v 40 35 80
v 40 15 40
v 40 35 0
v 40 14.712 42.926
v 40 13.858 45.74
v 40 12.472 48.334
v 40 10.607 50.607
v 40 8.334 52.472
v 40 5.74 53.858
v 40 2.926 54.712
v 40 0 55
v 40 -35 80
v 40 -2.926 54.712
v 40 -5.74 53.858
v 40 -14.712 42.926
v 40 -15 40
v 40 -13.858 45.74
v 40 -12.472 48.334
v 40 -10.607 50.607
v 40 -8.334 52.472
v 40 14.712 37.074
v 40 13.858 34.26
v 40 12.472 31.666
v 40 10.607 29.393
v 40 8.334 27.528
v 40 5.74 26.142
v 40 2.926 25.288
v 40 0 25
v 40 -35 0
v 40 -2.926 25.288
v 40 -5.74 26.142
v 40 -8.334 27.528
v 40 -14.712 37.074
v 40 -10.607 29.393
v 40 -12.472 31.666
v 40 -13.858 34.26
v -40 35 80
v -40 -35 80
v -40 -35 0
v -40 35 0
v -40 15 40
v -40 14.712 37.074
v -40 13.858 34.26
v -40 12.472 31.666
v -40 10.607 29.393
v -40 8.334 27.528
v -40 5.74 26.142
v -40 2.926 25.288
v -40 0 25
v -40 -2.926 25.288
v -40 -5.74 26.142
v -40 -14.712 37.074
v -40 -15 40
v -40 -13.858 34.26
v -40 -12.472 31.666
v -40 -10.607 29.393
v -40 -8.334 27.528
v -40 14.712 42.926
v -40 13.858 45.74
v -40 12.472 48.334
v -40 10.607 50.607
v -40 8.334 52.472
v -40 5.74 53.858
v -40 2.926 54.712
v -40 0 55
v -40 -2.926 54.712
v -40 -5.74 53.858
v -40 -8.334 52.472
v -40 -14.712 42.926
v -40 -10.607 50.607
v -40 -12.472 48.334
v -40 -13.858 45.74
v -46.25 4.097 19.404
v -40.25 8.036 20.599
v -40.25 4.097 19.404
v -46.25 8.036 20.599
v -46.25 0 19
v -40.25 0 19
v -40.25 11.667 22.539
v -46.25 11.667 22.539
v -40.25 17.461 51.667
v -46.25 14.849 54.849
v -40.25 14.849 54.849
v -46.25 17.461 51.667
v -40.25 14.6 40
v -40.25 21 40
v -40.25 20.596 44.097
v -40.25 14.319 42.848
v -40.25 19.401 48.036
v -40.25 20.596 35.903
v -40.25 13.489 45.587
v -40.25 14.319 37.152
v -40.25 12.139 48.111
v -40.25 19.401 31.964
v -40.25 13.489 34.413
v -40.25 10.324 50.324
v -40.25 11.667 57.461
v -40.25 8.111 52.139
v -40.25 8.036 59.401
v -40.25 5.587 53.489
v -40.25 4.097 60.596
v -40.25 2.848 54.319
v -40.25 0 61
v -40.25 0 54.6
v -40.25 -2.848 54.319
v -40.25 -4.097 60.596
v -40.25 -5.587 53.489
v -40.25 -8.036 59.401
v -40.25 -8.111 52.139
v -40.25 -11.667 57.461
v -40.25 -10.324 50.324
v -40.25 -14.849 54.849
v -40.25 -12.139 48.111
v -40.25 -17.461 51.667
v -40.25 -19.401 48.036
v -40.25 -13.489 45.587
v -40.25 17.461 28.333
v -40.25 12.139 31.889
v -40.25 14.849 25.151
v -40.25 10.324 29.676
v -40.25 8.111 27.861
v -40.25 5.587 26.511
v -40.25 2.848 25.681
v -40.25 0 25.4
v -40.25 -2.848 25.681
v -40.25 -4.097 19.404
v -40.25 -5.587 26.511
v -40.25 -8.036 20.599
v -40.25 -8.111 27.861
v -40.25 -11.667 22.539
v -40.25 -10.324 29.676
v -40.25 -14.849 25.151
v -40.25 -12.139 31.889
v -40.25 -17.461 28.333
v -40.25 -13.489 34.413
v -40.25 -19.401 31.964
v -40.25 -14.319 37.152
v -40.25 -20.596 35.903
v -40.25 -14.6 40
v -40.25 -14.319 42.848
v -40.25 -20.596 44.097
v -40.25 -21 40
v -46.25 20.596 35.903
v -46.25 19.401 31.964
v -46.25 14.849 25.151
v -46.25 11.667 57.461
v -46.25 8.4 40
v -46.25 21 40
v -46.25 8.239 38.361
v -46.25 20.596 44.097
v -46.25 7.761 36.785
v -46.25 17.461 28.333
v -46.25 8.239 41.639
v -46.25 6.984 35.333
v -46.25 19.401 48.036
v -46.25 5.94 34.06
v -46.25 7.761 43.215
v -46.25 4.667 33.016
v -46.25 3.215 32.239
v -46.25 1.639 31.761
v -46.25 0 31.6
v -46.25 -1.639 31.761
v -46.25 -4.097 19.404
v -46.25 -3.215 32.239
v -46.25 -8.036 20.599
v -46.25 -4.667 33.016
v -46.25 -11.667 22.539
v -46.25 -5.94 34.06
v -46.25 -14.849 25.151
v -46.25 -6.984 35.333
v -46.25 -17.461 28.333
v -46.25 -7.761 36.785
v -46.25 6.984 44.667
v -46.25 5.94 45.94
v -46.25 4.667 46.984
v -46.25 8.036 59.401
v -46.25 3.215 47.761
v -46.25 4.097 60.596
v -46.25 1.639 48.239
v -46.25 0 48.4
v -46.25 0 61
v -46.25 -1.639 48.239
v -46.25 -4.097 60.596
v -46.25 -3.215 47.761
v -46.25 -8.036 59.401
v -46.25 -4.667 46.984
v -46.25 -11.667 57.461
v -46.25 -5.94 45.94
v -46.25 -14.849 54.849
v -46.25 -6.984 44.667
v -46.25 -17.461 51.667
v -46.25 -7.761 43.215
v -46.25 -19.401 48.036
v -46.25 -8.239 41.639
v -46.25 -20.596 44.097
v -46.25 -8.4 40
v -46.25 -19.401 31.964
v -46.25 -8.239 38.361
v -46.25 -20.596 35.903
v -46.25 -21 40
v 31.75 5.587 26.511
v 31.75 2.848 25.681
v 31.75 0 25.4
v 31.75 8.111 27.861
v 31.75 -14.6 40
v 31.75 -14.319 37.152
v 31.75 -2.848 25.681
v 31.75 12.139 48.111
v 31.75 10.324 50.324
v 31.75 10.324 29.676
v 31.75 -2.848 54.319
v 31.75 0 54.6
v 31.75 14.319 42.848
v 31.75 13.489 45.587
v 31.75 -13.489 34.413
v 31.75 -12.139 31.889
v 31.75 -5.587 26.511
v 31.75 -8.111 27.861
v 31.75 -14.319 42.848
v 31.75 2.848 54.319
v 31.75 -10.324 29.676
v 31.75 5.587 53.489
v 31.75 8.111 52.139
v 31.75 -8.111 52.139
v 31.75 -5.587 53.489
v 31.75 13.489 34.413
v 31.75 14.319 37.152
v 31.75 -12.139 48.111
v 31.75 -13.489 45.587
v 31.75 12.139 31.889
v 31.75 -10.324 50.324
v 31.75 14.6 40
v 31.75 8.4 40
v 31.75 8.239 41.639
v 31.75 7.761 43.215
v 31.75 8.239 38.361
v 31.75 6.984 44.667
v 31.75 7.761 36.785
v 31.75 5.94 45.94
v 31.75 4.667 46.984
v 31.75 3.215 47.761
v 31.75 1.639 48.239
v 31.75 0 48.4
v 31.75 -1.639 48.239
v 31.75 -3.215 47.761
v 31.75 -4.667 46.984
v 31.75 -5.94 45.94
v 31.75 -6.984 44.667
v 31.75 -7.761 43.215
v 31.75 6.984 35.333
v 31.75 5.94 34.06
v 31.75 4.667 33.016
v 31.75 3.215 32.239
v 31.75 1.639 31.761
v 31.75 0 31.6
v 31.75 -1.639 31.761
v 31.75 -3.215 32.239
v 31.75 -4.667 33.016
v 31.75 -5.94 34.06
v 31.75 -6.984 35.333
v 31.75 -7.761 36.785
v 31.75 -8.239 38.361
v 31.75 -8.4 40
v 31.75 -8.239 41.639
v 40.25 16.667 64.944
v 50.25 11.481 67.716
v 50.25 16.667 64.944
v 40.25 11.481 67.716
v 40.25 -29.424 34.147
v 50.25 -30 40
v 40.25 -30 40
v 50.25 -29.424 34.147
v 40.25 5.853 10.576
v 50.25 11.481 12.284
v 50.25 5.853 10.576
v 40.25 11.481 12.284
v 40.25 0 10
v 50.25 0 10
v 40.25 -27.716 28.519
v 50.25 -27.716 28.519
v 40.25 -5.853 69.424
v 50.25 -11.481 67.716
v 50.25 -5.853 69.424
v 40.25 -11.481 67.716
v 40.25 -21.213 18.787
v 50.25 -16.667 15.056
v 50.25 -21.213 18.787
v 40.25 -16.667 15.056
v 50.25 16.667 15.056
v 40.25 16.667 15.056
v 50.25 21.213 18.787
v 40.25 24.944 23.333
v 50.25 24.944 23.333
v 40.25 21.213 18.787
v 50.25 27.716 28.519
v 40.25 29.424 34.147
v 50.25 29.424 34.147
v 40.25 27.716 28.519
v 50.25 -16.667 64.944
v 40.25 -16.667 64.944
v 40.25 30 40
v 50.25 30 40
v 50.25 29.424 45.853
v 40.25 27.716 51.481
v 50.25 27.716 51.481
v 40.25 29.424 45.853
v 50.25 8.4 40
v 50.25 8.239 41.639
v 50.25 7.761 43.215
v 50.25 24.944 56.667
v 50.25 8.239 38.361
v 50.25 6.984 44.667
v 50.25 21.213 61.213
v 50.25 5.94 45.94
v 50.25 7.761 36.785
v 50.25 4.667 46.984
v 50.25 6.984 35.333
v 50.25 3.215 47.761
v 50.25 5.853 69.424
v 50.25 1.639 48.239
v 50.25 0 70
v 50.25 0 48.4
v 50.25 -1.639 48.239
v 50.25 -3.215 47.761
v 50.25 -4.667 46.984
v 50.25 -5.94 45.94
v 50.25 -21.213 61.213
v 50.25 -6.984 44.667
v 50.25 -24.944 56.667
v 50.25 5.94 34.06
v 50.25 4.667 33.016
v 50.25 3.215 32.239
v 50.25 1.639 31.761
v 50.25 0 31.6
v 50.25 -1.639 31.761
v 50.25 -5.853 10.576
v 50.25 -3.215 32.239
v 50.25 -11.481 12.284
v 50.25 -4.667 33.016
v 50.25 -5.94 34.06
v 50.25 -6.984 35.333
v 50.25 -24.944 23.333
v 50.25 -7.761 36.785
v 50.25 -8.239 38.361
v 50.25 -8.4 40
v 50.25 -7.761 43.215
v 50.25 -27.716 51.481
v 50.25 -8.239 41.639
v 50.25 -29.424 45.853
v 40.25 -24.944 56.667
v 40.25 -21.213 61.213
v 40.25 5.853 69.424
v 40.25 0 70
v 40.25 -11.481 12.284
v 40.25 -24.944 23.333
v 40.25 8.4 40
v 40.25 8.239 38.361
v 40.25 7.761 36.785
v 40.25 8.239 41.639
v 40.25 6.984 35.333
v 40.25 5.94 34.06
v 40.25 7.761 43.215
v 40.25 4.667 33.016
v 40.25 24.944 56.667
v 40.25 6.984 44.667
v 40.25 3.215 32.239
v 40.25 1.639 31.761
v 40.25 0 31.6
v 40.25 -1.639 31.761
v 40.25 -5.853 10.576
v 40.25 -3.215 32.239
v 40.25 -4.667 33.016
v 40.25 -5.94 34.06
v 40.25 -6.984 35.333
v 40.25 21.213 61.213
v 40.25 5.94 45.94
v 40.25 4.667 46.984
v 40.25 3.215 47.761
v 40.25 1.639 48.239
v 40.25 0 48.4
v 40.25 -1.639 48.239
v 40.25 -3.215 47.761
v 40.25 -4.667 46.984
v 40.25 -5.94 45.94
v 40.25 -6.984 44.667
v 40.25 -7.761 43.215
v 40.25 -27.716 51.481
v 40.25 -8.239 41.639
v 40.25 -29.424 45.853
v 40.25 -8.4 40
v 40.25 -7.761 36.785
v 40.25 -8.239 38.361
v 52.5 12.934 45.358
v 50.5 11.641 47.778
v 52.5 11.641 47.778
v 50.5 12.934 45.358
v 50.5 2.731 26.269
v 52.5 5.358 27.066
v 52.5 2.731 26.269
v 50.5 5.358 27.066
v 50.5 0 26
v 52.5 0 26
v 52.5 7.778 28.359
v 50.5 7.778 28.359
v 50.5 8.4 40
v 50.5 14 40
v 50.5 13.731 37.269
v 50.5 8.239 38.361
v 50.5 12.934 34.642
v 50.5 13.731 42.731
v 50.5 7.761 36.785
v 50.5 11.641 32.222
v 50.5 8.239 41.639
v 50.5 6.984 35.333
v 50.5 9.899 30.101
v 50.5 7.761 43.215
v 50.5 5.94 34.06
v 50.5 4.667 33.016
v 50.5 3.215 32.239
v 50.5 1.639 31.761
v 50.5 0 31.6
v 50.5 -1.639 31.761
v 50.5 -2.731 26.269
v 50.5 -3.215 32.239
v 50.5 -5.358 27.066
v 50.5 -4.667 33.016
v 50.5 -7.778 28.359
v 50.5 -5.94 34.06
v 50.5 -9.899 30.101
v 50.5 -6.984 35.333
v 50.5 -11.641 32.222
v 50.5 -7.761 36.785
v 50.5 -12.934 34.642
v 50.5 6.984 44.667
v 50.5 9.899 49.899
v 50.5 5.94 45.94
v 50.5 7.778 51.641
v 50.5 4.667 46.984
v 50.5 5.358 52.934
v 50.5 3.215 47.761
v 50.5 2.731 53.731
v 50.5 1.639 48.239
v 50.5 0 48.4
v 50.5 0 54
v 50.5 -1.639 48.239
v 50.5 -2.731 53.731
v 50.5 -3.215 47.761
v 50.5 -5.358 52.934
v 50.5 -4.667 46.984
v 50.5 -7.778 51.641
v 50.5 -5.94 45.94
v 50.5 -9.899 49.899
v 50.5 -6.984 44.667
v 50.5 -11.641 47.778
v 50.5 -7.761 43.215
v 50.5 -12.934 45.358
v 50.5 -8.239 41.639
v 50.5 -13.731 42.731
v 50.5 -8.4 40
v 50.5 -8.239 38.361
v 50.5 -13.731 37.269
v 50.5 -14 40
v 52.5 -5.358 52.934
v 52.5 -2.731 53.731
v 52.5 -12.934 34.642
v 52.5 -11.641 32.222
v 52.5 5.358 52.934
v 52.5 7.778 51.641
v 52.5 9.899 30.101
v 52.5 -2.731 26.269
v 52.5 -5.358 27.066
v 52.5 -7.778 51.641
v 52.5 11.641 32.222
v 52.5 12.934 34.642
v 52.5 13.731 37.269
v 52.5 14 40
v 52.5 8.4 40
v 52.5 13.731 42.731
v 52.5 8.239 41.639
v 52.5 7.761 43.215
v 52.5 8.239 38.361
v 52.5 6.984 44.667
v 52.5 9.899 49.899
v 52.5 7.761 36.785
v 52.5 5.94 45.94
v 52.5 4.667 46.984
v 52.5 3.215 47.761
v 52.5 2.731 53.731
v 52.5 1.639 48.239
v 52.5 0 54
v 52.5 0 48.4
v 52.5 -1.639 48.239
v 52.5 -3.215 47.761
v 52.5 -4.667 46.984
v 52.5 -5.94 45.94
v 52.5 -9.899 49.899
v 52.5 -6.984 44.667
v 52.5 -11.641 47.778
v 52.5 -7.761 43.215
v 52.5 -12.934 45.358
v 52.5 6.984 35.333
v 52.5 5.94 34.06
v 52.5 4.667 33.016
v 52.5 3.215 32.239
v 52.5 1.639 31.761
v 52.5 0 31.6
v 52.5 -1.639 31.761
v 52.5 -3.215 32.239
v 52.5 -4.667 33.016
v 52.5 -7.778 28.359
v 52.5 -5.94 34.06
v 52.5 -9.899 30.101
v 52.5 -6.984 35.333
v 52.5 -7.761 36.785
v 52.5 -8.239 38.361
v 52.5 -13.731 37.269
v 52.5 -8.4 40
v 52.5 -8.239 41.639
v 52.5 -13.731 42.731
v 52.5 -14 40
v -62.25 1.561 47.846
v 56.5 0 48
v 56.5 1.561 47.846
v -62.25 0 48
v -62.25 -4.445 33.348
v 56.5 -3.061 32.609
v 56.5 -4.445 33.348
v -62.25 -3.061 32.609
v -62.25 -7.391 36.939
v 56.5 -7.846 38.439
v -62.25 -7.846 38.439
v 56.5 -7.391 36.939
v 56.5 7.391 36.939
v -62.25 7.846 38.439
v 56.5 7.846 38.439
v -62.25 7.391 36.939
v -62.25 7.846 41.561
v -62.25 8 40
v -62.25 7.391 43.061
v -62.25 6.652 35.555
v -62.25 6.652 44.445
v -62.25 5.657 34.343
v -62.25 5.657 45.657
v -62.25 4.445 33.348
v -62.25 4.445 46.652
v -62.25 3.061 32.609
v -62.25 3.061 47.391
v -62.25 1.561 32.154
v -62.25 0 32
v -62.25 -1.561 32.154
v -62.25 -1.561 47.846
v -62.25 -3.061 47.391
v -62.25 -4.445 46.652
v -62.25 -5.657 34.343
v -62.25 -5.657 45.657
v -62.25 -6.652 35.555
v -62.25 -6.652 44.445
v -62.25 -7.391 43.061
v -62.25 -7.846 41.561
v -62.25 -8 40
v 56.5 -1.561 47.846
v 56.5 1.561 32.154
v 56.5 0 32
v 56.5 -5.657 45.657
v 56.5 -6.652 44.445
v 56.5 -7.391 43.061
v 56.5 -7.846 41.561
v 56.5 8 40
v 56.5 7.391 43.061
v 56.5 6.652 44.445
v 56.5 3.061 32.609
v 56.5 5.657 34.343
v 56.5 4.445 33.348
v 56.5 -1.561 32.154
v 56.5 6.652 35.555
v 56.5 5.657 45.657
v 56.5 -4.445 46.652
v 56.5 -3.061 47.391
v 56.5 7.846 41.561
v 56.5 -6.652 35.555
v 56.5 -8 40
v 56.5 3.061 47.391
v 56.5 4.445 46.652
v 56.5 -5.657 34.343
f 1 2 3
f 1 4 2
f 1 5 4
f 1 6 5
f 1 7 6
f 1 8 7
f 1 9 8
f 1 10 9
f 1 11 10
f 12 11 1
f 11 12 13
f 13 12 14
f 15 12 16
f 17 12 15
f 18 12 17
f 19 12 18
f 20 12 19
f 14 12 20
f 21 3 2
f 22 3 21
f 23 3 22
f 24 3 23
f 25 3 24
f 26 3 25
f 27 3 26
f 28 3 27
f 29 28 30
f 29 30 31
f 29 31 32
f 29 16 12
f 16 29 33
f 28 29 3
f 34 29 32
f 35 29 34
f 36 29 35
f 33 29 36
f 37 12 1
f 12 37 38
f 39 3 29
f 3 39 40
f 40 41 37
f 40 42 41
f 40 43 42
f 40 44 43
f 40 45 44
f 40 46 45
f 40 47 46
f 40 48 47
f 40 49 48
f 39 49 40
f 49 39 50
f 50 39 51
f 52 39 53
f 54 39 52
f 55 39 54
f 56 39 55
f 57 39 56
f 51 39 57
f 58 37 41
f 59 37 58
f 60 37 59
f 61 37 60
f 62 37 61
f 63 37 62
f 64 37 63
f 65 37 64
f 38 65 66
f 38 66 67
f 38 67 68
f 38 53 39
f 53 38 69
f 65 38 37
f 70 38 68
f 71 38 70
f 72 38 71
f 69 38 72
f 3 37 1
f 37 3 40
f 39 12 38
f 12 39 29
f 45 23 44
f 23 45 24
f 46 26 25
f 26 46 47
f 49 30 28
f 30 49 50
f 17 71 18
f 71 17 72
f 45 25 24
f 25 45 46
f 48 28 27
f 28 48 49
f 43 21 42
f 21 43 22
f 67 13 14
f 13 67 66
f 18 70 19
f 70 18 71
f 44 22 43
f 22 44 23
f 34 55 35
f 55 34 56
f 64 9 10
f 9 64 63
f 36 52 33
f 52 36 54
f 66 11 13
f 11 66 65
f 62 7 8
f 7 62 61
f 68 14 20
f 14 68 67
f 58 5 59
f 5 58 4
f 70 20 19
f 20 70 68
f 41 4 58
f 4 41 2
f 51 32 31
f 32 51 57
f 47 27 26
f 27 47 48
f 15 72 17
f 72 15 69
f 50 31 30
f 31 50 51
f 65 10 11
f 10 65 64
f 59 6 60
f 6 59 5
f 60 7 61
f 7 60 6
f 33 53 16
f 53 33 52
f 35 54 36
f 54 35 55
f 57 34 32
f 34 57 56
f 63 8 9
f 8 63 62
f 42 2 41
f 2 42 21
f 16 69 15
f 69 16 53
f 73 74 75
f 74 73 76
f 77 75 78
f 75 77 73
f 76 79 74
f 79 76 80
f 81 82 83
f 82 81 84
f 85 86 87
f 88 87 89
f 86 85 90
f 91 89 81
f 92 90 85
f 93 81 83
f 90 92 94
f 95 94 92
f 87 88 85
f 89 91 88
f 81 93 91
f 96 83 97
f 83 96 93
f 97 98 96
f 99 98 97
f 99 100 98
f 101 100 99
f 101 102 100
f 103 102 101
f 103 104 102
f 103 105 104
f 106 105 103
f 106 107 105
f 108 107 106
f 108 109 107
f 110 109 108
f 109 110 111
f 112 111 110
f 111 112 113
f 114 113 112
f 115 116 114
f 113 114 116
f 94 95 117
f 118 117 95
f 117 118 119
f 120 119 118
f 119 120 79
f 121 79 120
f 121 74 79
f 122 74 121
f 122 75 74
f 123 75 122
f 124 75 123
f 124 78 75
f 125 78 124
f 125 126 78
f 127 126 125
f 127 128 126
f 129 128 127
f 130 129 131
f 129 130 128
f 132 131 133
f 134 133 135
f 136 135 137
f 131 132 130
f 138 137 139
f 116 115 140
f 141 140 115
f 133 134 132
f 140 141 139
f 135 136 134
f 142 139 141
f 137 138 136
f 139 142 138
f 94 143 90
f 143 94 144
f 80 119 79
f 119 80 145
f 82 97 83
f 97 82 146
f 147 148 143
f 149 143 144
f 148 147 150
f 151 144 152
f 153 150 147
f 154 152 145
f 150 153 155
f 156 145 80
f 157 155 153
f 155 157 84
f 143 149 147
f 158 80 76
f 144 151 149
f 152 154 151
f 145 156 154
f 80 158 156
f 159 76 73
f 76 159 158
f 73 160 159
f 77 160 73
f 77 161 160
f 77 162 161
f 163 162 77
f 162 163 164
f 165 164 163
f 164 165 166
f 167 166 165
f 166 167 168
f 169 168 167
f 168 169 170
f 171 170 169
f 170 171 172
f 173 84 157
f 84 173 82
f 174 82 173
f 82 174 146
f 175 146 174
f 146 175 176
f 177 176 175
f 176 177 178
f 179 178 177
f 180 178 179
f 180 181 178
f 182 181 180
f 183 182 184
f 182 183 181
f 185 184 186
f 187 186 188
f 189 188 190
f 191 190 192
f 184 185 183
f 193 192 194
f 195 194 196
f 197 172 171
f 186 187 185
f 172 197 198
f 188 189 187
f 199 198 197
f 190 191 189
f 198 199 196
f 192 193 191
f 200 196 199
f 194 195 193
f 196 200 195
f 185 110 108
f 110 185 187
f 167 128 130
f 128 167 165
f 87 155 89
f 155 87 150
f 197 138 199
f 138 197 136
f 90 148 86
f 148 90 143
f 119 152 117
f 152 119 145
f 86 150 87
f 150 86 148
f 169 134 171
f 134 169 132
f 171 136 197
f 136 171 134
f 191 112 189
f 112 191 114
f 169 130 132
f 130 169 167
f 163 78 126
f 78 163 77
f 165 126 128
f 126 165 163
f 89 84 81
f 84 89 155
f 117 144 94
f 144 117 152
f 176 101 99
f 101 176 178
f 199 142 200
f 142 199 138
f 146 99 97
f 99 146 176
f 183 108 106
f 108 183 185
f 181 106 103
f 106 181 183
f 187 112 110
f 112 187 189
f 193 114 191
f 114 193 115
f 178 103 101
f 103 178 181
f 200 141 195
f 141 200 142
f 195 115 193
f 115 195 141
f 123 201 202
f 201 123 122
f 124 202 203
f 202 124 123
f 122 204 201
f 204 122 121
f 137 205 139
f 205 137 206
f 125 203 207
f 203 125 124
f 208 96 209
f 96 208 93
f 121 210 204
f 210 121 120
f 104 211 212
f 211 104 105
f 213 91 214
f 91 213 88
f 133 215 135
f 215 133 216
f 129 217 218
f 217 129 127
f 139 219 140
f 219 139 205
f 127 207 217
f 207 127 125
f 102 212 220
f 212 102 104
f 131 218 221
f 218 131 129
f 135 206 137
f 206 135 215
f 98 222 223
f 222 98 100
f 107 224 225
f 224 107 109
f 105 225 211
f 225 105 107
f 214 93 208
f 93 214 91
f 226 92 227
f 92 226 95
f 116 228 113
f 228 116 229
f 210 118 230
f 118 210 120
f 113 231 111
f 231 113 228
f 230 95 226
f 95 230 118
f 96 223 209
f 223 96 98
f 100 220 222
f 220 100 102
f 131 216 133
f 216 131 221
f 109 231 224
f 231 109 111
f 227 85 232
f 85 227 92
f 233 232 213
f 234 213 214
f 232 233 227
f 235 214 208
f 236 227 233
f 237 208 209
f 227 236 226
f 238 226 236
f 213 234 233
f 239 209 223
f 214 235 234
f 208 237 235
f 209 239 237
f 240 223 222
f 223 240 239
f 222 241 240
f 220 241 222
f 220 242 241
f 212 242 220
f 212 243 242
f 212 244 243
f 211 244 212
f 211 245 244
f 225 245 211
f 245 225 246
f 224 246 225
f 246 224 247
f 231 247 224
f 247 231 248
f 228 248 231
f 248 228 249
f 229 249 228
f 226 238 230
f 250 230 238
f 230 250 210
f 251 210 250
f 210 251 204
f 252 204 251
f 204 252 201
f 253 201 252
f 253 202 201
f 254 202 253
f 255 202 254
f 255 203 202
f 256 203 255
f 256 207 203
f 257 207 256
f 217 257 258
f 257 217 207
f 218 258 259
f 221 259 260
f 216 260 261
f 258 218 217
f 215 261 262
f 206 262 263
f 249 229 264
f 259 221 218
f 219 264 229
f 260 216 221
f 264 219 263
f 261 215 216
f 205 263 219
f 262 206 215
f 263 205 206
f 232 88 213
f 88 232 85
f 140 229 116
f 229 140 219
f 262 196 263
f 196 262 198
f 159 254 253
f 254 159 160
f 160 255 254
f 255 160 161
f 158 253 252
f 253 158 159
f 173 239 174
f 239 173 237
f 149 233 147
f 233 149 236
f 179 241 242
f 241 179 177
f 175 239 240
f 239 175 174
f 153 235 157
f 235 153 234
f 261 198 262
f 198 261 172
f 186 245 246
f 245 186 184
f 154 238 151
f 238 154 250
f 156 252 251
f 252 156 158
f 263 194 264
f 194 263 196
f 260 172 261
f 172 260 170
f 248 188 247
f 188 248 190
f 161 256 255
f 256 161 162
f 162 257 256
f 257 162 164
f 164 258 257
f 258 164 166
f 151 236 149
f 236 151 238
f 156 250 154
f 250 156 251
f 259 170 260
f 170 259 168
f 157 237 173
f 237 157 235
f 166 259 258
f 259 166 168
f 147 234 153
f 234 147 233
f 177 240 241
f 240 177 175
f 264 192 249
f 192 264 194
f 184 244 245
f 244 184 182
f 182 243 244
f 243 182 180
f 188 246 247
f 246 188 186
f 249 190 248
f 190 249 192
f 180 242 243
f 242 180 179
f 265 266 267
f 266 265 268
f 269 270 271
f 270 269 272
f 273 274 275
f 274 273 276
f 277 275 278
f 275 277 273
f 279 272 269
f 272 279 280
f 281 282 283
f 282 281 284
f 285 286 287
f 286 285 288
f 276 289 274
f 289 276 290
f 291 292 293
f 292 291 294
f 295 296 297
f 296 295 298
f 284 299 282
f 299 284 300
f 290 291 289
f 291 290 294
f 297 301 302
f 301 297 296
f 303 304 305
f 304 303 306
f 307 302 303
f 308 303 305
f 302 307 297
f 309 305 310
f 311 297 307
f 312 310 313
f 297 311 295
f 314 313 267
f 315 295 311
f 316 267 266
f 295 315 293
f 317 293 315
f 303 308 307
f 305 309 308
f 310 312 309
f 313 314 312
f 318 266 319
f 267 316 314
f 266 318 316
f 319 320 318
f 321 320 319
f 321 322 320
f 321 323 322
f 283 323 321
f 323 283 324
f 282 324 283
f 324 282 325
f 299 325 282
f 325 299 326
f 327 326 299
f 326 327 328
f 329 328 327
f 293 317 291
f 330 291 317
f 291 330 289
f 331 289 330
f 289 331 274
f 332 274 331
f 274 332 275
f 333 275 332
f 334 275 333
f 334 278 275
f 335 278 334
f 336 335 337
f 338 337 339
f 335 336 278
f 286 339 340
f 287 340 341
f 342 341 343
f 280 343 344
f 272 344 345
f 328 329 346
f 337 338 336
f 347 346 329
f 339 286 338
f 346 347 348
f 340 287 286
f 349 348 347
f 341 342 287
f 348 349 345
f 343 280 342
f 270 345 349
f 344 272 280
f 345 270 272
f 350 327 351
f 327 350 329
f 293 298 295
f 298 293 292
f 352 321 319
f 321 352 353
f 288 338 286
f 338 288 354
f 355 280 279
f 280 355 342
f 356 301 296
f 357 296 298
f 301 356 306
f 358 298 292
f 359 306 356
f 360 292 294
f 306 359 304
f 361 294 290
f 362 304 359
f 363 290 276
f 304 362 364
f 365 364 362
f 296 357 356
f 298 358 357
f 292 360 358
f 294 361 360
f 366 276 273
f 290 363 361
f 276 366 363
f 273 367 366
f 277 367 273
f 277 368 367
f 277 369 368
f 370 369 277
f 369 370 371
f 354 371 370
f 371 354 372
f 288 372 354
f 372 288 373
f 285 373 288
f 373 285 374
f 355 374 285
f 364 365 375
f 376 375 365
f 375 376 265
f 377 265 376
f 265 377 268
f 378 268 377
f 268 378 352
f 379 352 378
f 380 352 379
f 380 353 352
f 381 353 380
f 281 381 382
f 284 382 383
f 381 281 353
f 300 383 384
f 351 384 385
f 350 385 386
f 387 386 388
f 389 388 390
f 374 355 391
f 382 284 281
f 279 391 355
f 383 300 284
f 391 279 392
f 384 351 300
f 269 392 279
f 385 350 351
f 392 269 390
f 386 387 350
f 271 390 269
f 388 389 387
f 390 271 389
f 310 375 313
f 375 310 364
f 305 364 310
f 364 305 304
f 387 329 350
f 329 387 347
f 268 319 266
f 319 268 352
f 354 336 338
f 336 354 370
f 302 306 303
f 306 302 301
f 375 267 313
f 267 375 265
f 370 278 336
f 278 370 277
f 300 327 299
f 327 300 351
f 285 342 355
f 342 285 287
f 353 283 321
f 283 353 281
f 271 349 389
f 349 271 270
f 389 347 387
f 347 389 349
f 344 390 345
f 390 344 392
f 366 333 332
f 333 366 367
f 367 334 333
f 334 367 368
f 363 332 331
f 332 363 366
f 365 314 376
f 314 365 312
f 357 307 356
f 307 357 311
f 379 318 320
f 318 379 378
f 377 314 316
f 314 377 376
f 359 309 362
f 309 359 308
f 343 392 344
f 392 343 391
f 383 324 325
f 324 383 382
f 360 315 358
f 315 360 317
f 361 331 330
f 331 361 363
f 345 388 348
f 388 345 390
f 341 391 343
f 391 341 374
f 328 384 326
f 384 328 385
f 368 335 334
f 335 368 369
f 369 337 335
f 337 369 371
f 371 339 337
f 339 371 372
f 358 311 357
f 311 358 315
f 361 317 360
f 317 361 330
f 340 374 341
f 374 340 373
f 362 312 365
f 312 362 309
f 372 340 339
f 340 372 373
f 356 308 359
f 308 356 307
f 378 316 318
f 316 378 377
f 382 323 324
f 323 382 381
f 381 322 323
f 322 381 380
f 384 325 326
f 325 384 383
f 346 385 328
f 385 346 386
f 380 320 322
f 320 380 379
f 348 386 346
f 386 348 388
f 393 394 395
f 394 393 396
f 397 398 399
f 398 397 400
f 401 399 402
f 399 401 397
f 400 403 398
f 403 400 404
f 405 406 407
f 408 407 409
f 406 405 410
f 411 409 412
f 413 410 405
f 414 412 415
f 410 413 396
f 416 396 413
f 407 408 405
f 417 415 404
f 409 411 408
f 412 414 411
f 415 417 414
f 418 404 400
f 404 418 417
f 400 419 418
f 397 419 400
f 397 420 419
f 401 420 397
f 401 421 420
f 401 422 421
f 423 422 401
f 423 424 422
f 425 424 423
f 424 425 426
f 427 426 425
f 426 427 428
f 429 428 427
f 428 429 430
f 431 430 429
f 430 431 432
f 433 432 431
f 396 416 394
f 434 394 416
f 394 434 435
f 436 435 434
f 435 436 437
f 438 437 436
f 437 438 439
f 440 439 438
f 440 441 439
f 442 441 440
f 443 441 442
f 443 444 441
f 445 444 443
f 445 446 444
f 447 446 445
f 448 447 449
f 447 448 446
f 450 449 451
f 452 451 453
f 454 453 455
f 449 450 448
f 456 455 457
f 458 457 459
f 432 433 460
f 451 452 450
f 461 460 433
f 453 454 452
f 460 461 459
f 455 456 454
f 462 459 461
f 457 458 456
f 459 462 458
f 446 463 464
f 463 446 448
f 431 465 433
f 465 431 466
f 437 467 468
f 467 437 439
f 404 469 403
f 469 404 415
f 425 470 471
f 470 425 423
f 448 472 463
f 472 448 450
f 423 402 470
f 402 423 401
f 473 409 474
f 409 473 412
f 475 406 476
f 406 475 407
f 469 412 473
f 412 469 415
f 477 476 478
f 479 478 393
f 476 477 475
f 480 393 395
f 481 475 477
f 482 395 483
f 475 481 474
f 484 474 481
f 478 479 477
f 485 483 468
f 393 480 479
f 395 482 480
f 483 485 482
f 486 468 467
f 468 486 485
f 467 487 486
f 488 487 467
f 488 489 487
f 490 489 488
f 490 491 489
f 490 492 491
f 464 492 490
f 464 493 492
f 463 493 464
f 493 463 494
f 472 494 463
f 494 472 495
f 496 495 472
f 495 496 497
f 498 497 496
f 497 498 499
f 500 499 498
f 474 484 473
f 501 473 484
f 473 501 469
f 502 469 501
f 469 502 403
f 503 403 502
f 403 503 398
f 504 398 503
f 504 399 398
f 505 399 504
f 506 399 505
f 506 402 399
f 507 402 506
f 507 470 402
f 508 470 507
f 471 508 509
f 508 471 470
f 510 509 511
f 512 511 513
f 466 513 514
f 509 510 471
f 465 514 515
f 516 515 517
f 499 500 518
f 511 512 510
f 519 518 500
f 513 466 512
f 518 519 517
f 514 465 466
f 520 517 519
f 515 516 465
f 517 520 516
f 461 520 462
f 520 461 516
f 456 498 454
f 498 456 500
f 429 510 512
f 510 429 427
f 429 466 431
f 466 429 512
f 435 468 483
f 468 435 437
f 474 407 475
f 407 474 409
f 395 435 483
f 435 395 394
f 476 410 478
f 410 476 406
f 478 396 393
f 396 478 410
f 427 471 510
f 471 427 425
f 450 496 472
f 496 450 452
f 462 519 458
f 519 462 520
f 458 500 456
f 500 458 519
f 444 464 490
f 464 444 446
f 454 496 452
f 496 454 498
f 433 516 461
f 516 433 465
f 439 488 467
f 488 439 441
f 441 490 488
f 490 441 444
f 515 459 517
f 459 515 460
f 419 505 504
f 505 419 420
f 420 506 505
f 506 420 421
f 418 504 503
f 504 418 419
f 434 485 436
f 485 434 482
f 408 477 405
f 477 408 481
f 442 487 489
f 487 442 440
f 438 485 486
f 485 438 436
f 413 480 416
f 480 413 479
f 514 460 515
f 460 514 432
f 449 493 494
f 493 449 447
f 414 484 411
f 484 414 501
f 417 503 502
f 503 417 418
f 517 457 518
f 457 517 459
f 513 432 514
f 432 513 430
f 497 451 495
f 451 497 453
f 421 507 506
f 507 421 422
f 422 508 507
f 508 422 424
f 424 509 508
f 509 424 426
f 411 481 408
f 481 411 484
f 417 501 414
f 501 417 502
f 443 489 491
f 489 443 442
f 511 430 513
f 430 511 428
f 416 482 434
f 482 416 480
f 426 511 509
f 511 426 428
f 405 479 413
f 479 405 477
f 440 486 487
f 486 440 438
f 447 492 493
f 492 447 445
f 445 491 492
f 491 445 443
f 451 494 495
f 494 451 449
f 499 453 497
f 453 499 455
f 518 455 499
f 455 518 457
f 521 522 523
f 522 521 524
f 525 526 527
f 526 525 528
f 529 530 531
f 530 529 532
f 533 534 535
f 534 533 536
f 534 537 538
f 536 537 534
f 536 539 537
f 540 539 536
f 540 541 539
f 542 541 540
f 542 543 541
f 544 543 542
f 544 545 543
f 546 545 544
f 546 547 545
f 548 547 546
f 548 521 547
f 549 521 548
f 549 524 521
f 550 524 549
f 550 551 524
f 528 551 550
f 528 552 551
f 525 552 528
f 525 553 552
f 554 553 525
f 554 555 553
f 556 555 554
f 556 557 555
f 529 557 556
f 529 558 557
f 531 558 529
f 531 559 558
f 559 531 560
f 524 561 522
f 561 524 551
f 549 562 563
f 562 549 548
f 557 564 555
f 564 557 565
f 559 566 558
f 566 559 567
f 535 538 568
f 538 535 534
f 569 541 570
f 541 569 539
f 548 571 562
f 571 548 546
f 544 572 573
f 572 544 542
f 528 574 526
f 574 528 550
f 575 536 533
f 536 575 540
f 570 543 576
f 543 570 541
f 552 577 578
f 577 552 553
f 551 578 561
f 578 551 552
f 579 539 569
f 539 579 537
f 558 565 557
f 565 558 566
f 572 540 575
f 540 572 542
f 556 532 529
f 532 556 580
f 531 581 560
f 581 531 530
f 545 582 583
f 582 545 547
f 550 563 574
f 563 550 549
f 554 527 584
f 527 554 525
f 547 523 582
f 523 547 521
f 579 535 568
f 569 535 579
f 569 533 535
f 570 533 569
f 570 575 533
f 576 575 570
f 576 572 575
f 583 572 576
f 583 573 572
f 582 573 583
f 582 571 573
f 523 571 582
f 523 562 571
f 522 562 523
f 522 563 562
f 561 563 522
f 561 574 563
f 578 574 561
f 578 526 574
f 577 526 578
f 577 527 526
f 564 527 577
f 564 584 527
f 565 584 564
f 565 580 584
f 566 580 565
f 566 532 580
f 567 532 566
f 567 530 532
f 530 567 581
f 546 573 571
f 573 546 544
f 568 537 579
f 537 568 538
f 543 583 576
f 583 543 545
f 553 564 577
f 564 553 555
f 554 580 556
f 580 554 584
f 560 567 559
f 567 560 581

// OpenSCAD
$fn = 32;

// ------------------------------------------------------------------------
// Bushed housing: 80 x 70 x 80 mm housing, bushing d29.2
// Every part is its own module, assembly() places them once.
// ------------------------------------------------------------------------

// --- part 1 ---
module housing() {
  difference() {
    translate([-40, -35, 0]) cube([80, 70, 80]);
    translate([0, 0, 40]) rotate([0, 90, 0]) cylinder(h = 82, d = 30, center = true);
  }
}

// --- part 2 ---
module bushing() {
  difference() {
    union() {
      cylinder(h = 6, d = 42);
      translate([0, 0, 6]) cylinder(h = 72, d = 29.2);
    }
    translate([0, 0, -1]) cylinder(h = 80, d = 16.8);
  }
}

// --- part 3 ---
module shaft() {
  translate([0, 0, -59.375]) cylinder(h = 118.75, d = 16);
}

// --- part 4 ---
module cover() {
  difference() {
    cylinder(h = 10, d = 60);
    translate([0, 0, -1]) cylinder(h = 12, d = 16.8);
  }
}

// --- part 5 ---
module washer() {
  difference() {
      translate([0, 0, 0]) cylinder(h = 2, d = 28);
      translate([0, 0, -1]) cylinder(h = 4, d = 16.8);
    }
}

// --- assembly ---
module assembly() {
  translate([0, 0, 0]) rotate([0, 0, 0]) housing();
  translate([-46.25, 0, 40]) rotate([0, 90, 0]) bushing();
  translate([-2.875, 0, 40]) rotate([0, 90, 0]) shaft();
  translate([40.25, 0, 40]) rotate([0, 90, 0]) cover();
  translate([50.5, 0, 40]) rotate([0, 90, 0]) washer();
}

assembly();
